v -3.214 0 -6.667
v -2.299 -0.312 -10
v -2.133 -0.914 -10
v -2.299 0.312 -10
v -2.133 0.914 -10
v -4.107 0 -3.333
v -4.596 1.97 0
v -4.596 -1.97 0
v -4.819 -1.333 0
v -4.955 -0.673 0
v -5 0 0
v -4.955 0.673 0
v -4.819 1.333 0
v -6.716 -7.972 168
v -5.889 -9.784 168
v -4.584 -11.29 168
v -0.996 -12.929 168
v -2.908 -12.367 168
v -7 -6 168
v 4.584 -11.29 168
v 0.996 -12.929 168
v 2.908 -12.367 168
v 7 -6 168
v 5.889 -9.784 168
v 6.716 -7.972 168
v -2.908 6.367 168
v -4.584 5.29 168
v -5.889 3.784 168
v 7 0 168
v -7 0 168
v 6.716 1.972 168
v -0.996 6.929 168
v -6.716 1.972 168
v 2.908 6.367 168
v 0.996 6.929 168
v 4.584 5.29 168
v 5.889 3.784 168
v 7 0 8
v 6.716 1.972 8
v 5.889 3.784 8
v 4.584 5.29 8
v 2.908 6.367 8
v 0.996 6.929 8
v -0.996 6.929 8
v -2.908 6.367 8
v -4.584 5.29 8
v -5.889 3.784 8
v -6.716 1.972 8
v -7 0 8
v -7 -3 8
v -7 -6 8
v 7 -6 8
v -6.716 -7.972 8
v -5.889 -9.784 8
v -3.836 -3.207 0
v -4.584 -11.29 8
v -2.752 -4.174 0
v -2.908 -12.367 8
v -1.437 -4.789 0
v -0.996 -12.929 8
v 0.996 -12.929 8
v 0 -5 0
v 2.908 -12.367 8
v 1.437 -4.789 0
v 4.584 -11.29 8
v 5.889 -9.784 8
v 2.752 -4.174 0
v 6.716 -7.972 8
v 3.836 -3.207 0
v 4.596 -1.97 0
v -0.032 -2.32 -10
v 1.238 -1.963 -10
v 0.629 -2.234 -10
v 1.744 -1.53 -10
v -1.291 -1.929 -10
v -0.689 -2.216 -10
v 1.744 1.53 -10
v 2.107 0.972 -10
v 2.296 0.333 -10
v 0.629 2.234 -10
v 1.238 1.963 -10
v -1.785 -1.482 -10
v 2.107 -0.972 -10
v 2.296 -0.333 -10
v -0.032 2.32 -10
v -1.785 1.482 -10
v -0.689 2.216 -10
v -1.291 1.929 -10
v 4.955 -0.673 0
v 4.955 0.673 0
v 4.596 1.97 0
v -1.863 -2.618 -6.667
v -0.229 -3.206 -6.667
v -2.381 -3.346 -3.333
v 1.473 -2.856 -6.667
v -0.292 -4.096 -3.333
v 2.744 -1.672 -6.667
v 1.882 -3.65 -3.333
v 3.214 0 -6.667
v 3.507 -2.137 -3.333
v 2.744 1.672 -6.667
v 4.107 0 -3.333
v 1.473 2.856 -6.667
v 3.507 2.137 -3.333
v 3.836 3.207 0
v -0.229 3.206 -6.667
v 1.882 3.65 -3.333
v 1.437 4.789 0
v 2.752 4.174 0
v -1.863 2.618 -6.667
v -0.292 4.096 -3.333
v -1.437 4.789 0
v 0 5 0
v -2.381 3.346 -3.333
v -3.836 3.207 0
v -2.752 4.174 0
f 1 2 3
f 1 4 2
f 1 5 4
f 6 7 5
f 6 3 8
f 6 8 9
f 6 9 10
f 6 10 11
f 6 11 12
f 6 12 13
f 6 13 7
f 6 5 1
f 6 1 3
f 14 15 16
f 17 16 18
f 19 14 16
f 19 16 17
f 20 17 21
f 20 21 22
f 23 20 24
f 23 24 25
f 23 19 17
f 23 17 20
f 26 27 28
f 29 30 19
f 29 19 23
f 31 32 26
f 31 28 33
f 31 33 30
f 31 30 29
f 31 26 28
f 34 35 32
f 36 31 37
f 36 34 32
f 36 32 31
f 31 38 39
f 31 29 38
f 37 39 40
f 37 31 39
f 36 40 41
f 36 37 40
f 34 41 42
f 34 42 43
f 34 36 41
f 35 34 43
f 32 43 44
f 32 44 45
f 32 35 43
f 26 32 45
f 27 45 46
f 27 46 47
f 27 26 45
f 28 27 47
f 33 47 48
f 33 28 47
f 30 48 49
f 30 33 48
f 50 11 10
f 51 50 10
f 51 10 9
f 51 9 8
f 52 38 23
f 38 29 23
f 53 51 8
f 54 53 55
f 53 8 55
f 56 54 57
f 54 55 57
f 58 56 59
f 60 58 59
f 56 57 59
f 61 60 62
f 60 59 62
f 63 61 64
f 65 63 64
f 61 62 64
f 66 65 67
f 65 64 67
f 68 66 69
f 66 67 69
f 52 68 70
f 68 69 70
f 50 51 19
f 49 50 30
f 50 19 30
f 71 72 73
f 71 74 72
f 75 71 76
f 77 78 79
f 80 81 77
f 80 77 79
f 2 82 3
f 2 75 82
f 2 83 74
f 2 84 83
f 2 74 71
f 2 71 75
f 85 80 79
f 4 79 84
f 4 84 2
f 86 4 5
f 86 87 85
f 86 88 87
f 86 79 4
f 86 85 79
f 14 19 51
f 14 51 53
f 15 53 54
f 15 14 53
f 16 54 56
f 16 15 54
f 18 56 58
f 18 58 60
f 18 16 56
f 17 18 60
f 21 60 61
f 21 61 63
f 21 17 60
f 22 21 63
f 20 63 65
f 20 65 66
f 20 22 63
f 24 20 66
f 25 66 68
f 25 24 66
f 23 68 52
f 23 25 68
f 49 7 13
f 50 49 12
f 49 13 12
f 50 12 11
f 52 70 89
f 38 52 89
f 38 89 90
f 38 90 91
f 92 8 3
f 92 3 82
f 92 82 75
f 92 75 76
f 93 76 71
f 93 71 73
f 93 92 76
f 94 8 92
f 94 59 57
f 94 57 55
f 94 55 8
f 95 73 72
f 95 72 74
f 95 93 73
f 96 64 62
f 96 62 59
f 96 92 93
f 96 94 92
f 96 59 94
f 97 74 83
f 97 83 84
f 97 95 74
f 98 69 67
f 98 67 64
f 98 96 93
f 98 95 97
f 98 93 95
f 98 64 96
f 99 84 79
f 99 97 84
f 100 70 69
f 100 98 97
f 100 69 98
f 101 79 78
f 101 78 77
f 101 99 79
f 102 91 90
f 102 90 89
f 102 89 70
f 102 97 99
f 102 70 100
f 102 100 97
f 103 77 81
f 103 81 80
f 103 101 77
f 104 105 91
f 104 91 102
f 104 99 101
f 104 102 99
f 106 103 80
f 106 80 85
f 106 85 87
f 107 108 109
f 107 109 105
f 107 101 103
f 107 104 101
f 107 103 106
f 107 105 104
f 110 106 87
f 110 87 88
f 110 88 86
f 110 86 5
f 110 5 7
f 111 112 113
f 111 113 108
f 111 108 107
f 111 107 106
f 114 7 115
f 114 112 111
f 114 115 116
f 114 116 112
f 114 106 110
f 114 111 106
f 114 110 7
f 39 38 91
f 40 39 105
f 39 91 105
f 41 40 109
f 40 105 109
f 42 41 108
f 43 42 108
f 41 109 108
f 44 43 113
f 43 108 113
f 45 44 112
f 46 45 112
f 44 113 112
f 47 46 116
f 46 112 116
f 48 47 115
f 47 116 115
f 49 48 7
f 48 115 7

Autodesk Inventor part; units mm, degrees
ref_plane "YZ Plane" through (0, 0, 0) normal (1, 0, 0) x (0, 1, 0)
ref_plane "XZ Plane" through (0, 0, 0) normal (0, 1, 0) x (-1, 0, 0)
sketch "Sketch4" plane through (0, 0, 0) normal (0, 0, -1) x (-1, 0, 0)
  circle A0 centre (0, 0) radius 5
  dimension "d17" = 10
ref_plane "Work Plane3" through (0, 0, 8) normal (0, 0, 1) x (1, 0, 0)
sketch "Sketch1" plane through (0, 0, 8) normal (0, 0, 1) x (1, 0, 0)
  line L0 (0, 0) -> (0, -6) construction
  line L1 (-7, 0) -> (-7, -6)
  line L2 (7, -6) -> (7, 0)
  arc A0 (7, 0) -> (-7, 0) centre (0, 0) ccw
  arc A1 (-7, -6) -> (7, -6) centre (0, -6) ccw
  point P0 (0, -3)
  dimension "d0" = 6
  dimension "d1" = 14
extrude "Extrusion1" add sketch "Sketch1" along normal blind 30
ref_plane "Work Plane1" through (0, 0, 68) normal (0, 0, 1) x (1, 0, 0)
ref_plane "Work Plane2" through (0, 0, 168) normal (0, 0, 1) x (1, 0, 0)
sketch "Sketch2" plane through (0, 0, 68) normal (0, 0, 1) x (1, 0, 0)
  arc A0 (-7, -6) -> (7, -6) centre (0, -6) ccw projected
  line L0 (7, -6) -> (7, 0) projected
  arc A1 (7, 0) -> (-7, 0) centre (0, 0) ccw projected
  line L1 (-7, 0) -> (-7, -6) projected
extrude "Extrusion2" add sketch "Sketch2" along normal up to surface (100 mm away)
loft "Loft1" add section 1 edges at (0, -13, 38) (7, -3, 38) (0, 7, 38) (-7, -3, 38) section 2 edges at (7, -3, 68) (0, -13, 68) (-7, -3, 68) (0, 7, 68)
ref_plane "Work Plane4" through (0, 0, 38) normal (0, 0, 1) x (1, 0, 0)
loft "Loft2" add profiles "Sketch4" section 1 edges at (0, -13, 8) (-7, -3, 8) (0, 7, 8) (7, -3, 8)
sketch "Sketch5" plane through (0, 0, 0) normal (0, 0, -1) x (-1, 0, 0)
  arc A0 (-4.5957, -1.9696) -> (4.5957, -1.9696) centre (0, 0) ccw projected
  arc A1 (4.5957, -1.9696) -> (4.5957, 1.9696) centre (0, 0) ccw projected
  arc A2 (4.5957, 1.9696) -> (-4.5957, 1.9696) centre (0, 0) ccw projected
  arc A3 (-4.5957, 1.9696) -> (-4.5957, -1.9696) centre (0, 0) ccw projected
extrude "Extrusion4" add sketch "Sketch5" along normal blind 10 draft -15
properties part number "Form_test"
